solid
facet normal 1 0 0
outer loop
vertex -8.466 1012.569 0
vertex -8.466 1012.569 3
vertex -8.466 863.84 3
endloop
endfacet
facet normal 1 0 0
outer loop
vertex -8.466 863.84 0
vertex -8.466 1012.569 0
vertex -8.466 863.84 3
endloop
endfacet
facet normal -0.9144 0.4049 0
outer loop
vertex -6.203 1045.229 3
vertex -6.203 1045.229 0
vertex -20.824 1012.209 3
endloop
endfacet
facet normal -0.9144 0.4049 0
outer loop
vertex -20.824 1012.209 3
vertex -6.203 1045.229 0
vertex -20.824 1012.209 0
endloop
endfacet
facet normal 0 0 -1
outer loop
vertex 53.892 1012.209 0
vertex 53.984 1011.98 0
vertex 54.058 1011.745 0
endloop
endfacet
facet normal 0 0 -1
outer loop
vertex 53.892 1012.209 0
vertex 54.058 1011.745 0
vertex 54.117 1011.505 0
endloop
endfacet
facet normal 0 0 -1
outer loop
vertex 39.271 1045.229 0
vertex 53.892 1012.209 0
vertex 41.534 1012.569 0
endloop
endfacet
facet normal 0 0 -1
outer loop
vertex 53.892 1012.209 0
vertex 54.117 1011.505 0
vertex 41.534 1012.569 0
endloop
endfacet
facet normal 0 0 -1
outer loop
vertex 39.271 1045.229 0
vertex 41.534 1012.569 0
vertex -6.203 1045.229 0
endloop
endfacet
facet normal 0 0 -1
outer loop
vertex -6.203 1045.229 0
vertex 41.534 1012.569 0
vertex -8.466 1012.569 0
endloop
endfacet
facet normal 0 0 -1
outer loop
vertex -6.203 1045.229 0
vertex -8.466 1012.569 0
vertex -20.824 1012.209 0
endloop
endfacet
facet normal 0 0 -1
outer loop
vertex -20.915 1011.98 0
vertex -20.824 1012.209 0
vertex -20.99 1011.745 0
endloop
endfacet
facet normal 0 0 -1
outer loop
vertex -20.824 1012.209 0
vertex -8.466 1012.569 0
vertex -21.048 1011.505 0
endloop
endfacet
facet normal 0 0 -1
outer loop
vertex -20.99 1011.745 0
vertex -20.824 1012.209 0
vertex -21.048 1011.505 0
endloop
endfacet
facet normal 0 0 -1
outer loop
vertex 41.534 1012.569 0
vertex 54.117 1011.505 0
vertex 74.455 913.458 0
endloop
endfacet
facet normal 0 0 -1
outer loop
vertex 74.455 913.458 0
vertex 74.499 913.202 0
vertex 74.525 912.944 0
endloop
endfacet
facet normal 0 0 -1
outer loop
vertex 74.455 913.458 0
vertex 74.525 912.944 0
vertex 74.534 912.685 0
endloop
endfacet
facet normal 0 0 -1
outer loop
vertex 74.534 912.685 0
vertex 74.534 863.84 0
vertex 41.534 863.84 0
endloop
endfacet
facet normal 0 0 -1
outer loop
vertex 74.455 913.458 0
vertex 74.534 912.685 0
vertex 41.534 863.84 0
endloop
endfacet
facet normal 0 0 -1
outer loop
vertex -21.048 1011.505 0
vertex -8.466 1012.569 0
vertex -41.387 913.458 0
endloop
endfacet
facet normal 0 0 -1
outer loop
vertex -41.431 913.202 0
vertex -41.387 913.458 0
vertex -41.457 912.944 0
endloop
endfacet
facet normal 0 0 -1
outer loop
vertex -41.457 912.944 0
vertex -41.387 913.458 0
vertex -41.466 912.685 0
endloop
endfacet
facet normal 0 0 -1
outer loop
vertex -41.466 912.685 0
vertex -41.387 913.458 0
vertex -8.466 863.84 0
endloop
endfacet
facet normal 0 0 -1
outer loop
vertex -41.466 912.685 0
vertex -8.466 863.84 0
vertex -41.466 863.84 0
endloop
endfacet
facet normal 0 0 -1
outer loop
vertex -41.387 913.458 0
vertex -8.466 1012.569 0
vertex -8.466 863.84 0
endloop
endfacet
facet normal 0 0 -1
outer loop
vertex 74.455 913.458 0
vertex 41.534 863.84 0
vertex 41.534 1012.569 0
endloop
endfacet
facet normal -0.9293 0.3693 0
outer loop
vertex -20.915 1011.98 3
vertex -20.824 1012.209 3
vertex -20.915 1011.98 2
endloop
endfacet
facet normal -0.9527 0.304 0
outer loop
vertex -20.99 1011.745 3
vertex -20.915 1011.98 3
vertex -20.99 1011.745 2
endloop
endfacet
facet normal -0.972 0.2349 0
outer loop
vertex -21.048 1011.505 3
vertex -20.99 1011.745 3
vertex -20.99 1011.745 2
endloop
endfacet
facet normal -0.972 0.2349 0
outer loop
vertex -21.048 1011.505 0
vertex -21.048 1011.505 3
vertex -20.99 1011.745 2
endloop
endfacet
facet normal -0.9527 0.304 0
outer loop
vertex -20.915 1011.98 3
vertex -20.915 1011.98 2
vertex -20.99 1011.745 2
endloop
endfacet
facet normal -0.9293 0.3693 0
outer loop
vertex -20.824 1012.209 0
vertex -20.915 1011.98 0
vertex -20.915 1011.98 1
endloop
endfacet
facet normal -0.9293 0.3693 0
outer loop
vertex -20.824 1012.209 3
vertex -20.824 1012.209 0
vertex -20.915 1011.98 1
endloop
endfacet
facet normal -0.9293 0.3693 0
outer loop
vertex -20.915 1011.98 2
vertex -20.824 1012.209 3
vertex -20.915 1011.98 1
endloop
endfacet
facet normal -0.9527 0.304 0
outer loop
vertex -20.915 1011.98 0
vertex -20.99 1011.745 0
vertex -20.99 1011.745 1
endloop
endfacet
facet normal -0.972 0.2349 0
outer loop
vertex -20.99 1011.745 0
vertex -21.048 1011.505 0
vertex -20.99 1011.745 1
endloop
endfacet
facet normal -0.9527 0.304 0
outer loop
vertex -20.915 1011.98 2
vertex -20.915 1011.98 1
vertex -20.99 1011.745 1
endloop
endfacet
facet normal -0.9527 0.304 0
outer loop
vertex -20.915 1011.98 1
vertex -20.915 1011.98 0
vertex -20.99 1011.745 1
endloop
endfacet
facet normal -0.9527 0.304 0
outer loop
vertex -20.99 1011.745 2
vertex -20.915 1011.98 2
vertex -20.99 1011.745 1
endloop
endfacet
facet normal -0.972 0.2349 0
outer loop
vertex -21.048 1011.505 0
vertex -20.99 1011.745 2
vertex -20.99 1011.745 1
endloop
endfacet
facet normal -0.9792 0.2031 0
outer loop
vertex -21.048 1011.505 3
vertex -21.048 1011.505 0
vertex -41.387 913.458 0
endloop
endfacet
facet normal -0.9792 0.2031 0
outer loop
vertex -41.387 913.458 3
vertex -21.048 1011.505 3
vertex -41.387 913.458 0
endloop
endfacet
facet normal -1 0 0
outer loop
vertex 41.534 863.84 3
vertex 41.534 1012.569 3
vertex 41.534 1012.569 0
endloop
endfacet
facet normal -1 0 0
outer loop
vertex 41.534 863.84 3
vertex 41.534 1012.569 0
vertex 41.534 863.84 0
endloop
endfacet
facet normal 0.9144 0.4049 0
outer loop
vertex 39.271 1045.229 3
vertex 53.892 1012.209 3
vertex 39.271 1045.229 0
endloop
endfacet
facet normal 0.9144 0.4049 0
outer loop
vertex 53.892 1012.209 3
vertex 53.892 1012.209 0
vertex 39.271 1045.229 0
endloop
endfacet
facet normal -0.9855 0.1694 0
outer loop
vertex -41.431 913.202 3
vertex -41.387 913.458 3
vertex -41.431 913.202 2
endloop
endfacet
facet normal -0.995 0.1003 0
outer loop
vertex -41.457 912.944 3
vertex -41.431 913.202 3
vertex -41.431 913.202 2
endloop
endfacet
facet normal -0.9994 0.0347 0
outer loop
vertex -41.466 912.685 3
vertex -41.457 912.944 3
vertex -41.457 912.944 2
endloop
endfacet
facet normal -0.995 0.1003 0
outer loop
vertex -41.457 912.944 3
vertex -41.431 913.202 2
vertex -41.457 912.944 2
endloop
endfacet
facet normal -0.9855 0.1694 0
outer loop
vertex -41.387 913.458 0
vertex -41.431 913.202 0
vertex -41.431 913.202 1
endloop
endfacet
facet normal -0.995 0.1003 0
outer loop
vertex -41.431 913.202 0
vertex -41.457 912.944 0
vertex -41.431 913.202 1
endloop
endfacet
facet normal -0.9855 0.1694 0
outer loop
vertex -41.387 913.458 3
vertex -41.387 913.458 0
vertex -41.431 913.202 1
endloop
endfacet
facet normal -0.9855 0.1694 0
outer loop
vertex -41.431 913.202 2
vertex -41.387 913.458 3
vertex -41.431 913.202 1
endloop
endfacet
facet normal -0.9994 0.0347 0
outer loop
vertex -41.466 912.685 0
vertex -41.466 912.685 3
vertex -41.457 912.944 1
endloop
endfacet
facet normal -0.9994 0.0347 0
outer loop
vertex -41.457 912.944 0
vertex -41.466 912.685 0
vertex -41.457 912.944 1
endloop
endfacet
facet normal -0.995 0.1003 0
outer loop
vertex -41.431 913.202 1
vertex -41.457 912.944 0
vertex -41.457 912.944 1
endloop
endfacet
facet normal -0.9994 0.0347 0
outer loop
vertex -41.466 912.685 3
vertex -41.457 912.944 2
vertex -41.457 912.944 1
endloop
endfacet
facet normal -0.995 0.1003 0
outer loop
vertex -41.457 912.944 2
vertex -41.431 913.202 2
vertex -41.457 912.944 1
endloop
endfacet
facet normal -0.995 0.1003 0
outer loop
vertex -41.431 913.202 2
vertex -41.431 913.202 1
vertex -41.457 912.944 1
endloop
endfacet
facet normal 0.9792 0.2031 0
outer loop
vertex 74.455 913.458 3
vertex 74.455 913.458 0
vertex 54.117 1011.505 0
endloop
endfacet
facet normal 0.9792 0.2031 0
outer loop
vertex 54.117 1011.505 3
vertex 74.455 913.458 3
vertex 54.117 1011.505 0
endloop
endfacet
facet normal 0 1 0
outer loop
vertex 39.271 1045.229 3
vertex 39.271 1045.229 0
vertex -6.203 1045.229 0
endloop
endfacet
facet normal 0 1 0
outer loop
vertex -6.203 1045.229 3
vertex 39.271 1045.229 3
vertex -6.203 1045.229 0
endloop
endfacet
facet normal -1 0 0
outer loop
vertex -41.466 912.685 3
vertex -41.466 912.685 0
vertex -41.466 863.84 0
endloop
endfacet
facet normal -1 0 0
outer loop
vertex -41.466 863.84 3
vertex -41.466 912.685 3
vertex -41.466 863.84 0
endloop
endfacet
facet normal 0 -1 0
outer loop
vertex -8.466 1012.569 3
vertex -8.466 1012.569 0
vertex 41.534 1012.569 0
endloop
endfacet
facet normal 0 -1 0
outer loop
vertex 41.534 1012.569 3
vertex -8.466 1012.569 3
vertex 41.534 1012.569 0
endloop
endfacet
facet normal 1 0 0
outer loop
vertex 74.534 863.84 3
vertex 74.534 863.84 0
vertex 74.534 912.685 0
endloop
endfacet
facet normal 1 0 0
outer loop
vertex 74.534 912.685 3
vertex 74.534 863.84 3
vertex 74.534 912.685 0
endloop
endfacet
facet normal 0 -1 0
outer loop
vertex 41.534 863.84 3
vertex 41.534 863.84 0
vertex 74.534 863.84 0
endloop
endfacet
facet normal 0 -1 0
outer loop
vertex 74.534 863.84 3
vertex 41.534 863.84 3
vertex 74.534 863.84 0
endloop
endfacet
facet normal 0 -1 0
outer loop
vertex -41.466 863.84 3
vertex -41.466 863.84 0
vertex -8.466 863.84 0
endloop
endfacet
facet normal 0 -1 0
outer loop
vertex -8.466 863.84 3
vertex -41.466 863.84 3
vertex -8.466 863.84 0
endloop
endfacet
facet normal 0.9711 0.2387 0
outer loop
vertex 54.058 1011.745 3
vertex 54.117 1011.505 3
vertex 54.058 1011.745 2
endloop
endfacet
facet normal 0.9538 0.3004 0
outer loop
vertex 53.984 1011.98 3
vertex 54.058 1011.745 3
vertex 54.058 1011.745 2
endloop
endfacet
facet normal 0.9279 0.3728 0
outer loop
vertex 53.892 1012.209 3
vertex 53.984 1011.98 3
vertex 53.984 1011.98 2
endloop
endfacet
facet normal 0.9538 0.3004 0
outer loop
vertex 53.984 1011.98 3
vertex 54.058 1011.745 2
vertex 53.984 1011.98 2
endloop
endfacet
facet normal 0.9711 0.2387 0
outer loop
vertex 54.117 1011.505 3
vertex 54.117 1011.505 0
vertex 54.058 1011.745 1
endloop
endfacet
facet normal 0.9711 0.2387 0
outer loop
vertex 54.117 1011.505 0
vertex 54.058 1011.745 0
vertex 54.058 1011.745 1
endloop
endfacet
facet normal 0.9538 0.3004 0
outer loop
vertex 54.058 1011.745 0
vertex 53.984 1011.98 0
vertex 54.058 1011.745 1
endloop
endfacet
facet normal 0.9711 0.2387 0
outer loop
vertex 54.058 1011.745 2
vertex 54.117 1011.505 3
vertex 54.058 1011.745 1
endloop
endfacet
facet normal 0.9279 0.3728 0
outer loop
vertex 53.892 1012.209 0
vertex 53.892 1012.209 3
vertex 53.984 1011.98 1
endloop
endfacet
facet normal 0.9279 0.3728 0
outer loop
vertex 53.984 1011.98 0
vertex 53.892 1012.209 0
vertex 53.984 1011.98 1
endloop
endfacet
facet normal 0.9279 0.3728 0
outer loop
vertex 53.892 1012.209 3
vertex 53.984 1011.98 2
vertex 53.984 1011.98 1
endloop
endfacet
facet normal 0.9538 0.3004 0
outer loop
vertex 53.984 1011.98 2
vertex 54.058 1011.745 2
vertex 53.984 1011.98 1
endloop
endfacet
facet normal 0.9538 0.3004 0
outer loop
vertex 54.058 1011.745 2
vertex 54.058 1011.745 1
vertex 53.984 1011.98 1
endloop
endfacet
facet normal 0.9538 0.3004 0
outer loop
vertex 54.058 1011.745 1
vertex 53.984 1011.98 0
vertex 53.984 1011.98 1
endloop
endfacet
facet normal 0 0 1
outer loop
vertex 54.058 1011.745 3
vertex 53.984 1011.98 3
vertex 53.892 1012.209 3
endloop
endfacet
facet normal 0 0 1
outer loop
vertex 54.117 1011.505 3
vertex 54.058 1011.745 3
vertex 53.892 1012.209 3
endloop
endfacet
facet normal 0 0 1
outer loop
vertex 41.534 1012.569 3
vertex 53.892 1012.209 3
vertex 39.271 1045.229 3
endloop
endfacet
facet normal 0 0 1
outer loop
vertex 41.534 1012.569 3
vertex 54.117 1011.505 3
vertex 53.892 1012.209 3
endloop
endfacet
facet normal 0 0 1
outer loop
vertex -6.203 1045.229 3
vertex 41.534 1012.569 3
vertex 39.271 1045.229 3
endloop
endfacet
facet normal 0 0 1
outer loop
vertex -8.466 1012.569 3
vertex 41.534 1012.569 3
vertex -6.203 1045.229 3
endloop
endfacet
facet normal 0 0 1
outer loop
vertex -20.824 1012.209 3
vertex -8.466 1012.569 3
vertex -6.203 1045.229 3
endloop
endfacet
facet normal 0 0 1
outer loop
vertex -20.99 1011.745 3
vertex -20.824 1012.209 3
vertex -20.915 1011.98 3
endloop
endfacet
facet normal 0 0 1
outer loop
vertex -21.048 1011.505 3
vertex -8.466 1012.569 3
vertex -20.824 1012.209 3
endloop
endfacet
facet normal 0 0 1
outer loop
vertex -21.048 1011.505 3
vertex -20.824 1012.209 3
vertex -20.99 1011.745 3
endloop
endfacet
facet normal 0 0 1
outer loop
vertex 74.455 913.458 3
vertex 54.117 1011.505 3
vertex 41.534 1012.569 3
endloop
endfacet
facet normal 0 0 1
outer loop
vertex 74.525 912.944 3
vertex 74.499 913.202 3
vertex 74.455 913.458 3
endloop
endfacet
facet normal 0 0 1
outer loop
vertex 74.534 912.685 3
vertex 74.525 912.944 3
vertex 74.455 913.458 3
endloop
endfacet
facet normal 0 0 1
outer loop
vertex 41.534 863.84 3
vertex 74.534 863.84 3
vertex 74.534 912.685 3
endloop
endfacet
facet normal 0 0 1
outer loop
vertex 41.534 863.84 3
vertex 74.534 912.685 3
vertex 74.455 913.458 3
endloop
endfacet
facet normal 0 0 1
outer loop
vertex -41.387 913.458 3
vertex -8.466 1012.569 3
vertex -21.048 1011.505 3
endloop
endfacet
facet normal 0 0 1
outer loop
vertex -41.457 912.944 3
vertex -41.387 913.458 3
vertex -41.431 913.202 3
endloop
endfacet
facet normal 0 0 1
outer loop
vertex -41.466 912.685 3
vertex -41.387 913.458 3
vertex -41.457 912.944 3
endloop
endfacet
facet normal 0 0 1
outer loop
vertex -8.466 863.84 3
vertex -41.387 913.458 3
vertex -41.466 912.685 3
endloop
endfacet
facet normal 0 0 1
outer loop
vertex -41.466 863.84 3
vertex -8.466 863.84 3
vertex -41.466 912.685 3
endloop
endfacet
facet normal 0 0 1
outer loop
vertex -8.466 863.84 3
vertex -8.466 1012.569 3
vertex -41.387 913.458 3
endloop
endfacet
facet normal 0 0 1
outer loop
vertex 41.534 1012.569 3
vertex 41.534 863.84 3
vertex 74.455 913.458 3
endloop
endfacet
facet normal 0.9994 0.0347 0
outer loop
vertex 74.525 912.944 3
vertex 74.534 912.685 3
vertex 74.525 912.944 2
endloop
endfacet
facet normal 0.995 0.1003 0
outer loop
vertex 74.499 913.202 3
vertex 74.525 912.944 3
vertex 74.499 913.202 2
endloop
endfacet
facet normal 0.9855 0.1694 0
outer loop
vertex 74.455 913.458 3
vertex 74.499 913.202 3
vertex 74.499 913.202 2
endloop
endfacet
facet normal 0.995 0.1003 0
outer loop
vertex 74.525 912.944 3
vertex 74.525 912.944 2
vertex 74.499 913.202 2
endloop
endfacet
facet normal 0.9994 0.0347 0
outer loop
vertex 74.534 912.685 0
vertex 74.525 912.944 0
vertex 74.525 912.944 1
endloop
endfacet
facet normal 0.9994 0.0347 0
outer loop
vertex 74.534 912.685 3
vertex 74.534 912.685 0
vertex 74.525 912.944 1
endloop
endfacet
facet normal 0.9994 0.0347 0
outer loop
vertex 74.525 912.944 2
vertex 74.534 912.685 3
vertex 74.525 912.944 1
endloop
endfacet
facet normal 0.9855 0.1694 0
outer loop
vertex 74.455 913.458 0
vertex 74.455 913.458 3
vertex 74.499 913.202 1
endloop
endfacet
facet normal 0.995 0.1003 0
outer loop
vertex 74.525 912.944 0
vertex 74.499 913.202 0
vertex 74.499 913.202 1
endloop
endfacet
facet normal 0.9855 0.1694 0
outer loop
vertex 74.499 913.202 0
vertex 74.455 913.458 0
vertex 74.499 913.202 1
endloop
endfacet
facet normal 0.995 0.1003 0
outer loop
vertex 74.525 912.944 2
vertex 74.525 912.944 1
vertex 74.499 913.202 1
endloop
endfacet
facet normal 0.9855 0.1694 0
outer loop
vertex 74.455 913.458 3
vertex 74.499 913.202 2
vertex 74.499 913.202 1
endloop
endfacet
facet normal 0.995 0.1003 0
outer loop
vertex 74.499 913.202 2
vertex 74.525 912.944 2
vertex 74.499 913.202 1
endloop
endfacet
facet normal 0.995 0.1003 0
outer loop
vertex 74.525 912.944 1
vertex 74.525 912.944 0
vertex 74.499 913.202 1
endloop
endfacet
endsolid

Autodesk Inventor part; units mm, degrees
ref_plane "YZ Plane" through (0, 0, 0) normal (1, 0, 0) x (0, 1, 0)
ref_plane "XZ Plane" through (0, 0, 0) normal (0, 1, 0) x (-1, 0, 0)
ref_plane "Work Plane1" through (16.5341, 952.9567, 0) normal (0, 0, 1) x (-1, 0, 0)
sketch "Sketch4" plane through (16.5341, 952.9567, 3) normal (0, 0, 1) x (1, 0, 0)
  line L0 (-26.5, -89.1167) -> (-26.5, 59.6119)
  line L1 (26.5, 59.6119) -> (26.5, -89.1167)
  line L2 (-26.5, 59.6119) -> (26.5, 59.6119)
  line L3 (-25, 59.6119) -> (-25, -89.1167)
  line L4 (26.5, 59.6119) -> (-26.5, 59.6119)
  line L5 (25, 59.6119) -> (25, -89.1167)
  line L6 (-26.5, -89.1167) -> (-25, -89.1167)
  line L7 (58, -89.1167) -> (26.5, -89.1167)
  line L8 (26.5, -89.1167) -> (25, -89.1167)
  point P0 (-16.5341, -952.9567)
  dimension "d15" = 1.5
  dimension "d16" = 1.5
sketch "Sketch1" plane through (16.5341, 952.9567, 0) normal (0, 0, 1) x (-1, 0, 0)
  line L0 (60, 40.2719) -> (60, 137.1193)
  ellipse E0 centre (56, 137.1193) end of major axis (56, 141.9614) minor radius 4 (60, 137.1193) -> (56, 141.9614) ccw
  line L1 (56, 141.9614) -> (24.75, 141.9614)
  line L2 (24.75, 141.9614) -> (24.75, 144.3824)
  line L3 (24.75, 144.3824) -> (24.75, 146.8034)
  line L4 (24.75, 146.8034) -> (56, 146.8034)
  ellipse E1 centre (56, 137.1193) end of major axis (56, 146.8034) minor radius 8 (64, 137.1193) -> (56, 146.8034) ccw
  line L5 (64, 137.1193) -> (64, 40.2719)
  ellipse E2 centre (56, 40.2719) end of major axis (56, 30.5879) minor radius 8 (63.7591, 37.9134) -> (64, 40.2719) ccw
  line L6 (63.7591, 37.9134) -> (43.4204, -60.1335)
  ellipse E3 centre (35.6613, -57.775) end of major axis (35.6613, -67.459) minor radius 8 (42.7123, -62.3499) -> (43.4204, -60.1335) ccw
  line L7 (42.7123, -62.3499) -> (7.051, -142.8866)
  ellipse E4 centre (0, -138.3116) end of major axis (0, -147.9957) minor radius 8 (-7.051, -142.8866) -> (7.051, -142.8866) ccw
  line L8 (-7.051, -142.8866) -> (-42.7123, -62.3499)
  ellipse E5 centre (-35.6613, -57.775) end of major axis (-35.6613, -67.459) minor radius 8 (-43.4204, -60.1335) -> (-42.7123, -62.3499) ccw
  line L9 (-43.4204, -60.1335) -> (-63.7591, 37.9134)
  ellipse E6 centre (-56, 40.2719) end of major axis (-56, 30.5879) minor radius 8 (-64, 40.2719) -> (-63.7591, 37.9134) ccw
  line L10 (-64, 40.2719) -> (-64, 137.1193)
  ellipse E7 centre (-56, 137.1193) end of major axis (-56, 146.8034) minor radius 8 (-56, 146.8034) -> (-64, 137.1193) ccw
  line L11 (-56, 146.8034) -> (-24.75, 146.8034)
  line L12 (-24.75, 146.8034) -> (-24.75, 144.3824)
  line L13 (-24.75, 144.3824) -> (-24.75, 141.9614)
  line L14 (-24.75, 141.9614) -> (-56, 141.9614)
  ellipse E8 centre (-56, 137.1193) end of major axis (-56, 141.9614) minor radius 4 (-56, 141.9614) -> (-60, 137.1193) ccw
  line L15 (-60, 137.1193) -> (-60, 40.2719)
  ellipse E9 centre (-56, 40.2719) end of major axis (-56, 35.4299) minor radius 4 (-60, 40.2719) -> (-59.8796, 39.0927) ccw
  line L16 (-59.8796, 39.0927) -> (-39.5409, -58.9542)
  ellipse E10 centre (-35.6613, -57.775) end of major axis (-35.6613, -62.617) minor radius 4 (-39.5409, -58.9542) -> (-39.1868, -60.0624) ccw
  line L17 (-39.1868, -60.0624) -> (-3.5255, -140.5991)
  ellipse E11 centre (0, -138.3116) end of major axis (0, -143.1536) minor radius 4 (-3.5255, -140.5991) -> (3.5255, -140.5991) ccw
  line L18 (3.5255, -140.5991) -> (39.1868, -60.0624)
  ellipse E12 centre (35.6613, -57.775) end of major axis (35.6613, -62.617) minor radius 4 (39.1868, -60.0624) -> (39.5409, -58.9542) ccw
  line L19 (39.5409, -58.9542) -> (59.8796, 39.0927)
  ellipse E13 centre (56, 40.2719) end of major axis (56, 35.4299) minor radius 4 (59.8796, 39.0927) -> (60, 40.2719) ccw
  line L20 (-24.75, 141.9614) -> (24.75, 141.9614)
  line L21 (-60, 91.1167) -> (60, 91.1167)
  line L22 (-24.0389, -94.2722) -> (24.0389, -94.2722)
  line L23 (-24.5, 91.1167) -> (-24.5, -57.6119)
  line L24 (-24.5, -57.6119) -> (24.5, -57.6119)
  line L25 (24.5, -57.6119) -> (24.5, 91.1167)
  point P0 (16.5341, 952.9567)
  dimension "d0" = 49
  dimension "d1" = 120
  dimension "d2" = 35.5
  dimension "d3" = 88.0788
  dimension "d4" = 44.0394
  dimension "d5" = 101.6894
  dimension "d6" = 50.8447
  dimension "d7" = 15
extrude "Plate1" add sketch "Sketch1" along normal blind 3 contours E13 L19 E12 L18 L22 L17 E10 L16 E9 L15 L21 L23 L24 L25 L0
sketch "Sketch2" plane through (16.5341, 952.9567, 0) normal (0, 0, -1) x (-1, 0, 0)
  line L0 (60, -40.2719) -> (60, -91.1167) projected
  ellipse E0 centre (56, -40.2719) end of major axis (56, -35.4299) minor radius 4 (60, -40.2719) -> (59.8796, -39.0927) ccw projected
  line L1 (39.5409, 58.9542) -> (59.8796, -39.0927) projected
  ellipse E1 centre (35.6613, 57.775) end of major axis (35.6613, 62.617) minor radius 4 (39.5409, 58.9542) -> (39.1868, 60.0624) ccw projected
  line L2 (24.0389, 94.2722) -> (39.1868, 60.0624) projected
  line L3 (-24.0389, 94.2722) -> (24.0389, 94.2722) projected
  line L4 (-39.1868, 60.0624) -> (-24.0389, 94.2722) projected
  ellipse E2 centre (-35.6613, 57.775) end of major axis (-35.6613, 62.617) minor radius 4 (-39.1868, 60.0624) -> (-39.5409, 58.9542) ccw projected
  line L5 (-59.8796, -39.0927) -> (-39.5409, 58.9542) projected
  ellipse E3 centre (-56, -40.2719) end of major axis (-56, -35.4299) minor radius 4 (-59.8796, -39.0927) -> (-60, -40.2719) ccw projected
  line L6 (-60, -91.1167) -> (-60, -40.2719) projected
  line L7 (-24.5, -91.1167) -> (-60, -91.1167) projected
  line L8 (-24.5, 57.6119) -> (-24.5, -91.1167) projected
  line L9 (24.5, 57.6119) -> (-24.5, 57.6119) projected
  line L10 (24.5, -91.1167) -> (24.5, 57.6119) projected
  line L11 (60, -91.1167) -> (24.5, -91.1167) projected
  line L12 (-57.9212, -39.4989) -> (-37.5826, 58.548)
  line L13 (-37.3581, 59.2527) -> (-22.7372, 92.2722)
  line L14 (-22.7372, 92.2722) -> (22.7372, 92.2722)
  line L15 (22.7372, 92.2722) -> (37.3581, 59.2527)
  line L16 (37.5826, 58.548) -> (57.9212, -39.4989)
  line L17 (58, -40.2719) -> (58, -89.1167)
  line L18 (58, -89.1167) -> (26.5, -89.1167)
  line L19 (26.5, -89.1167) -> (26.5, 59.6119)
  line L20 (26.5, 59.6119) -> (-26.5, 59.6119)
  line L21 (-26.5, 59.6119) -> (-26.5, -89.1167)
  line L22 (-26.5, -89.1167) -> (-58, -89.1167)
  line L23 (-58, -89.1167) -> (-58, -40.2719)
  spline S0 degree 3 poles (-58, -40.2719) (-58, -40.0125) (-57.9739, -39.753) (-57.9212, -39.4989) knots 0 0 0 0 1 1 1 1
  spline S1 degree 3 poles (-37.5826, 58.548) (-37.5324, 58.7898) (-37.4581, 59.0268) (-37.3581, 59.2527) knots 0 0 0 0 1 1 1 1
  spline S2 degree 3 poles (37.3581, 59.2527) (37.4581, 59.0268) (37.5324, 58.7898) (37.5826, 58.548) knots 0 0 0 0 1 1 1 1
  spline S3 degree 3 poles (57.9212, -39.4989) (57.9739, -39.753) (58, -40.0125) (58, -40.2719) knots 0 0 0 0 1 1 1 1
  point P0 (16.5341, -952.9567)
  dimension "d9" = 2
extrude "Cut1" cut sketch "Sketch2" against normal blind 3
ref_plane "midtplan" through (16.5341, 863.84, 0) normal (1, 0, 0) x (0, 0, -1)
ref_plane "modplan parallel med plade" through (16.5341, 952.9567, 1.5) normal (0, 0, 1) x (1, 0, 0)
sheet face with bend "Face2" sketch "Sketch4" thickness 3 toward (0, 0, -1) bend radius 3
bend "Bend1"
equation "\"d2\" = -0.5 * d0 + 0.5 * d1"
equation "\"d4\" = 0.5 * d3"
equation "\"d6\" = 0.5 * d5"
equation "\"d10\" = Thickness"
equation "\"d16\" = d15"
equation "\"d8\" = Thickness"
equation "\"d17\" = BendRadius"
equation "\"d18\" = BendReliefWidth"
equation "\"d20\" = MinimumRemnant"
equation "\"d19\" = BendReliefDepth"
equation "\"d21\" = TransitionRadius"
equation "\"Thickness\" = pladetykkelse"
equation "\"BendRadius\" = Thickness"
equation "\"BendReliefWidth\" = Thickness"
equation "\"BendReliefDepth\" = 0.5 * Thickness"
equation "\"CornerReliefSize\" = 4 * Thickness"
equation "\"MinimumRemnant\" = 2 * Thickness"
equation "\"TransitionRadius\" = BendRadius"
equation "\"JacobiRadiusSize\" = BendRadius"
equation "\"GapSize\" = Thickness"
equation "\"pladetykkelse\" = 3"
equation "\"trappevinkel\" = 34.3deg"
equation "\"trappestifter_dia\" = 25"
equation "\"trappestifter_huldia\" = 25.8"
equation "\"trappestifter_skraa_huldia\" = 26.6"
equation "\"trappestifter_laengde\" = 228"
equation "\"perforeringsbredde\" = 6"
equation "\"perforeringshullaengde\" = 62.8"
equation "\"perforeringshullaengde_top\" = 61"
equation "\"perforeringshullaengde_bund\" = 61.6"
equation "\"perforeringsoffset\" = 8"
equation "\"perforeringsoffset_top\" = 8"
equation "\"perforeringsoffset_bund\" = 8"
equation "\"laskehul_dia\" = 13"
equation "\"balusterhul_udvidelse\" = 1"
equation "\"trinbredde\" = 1884"
properties part number "baluster-fod" material "S355MC"
